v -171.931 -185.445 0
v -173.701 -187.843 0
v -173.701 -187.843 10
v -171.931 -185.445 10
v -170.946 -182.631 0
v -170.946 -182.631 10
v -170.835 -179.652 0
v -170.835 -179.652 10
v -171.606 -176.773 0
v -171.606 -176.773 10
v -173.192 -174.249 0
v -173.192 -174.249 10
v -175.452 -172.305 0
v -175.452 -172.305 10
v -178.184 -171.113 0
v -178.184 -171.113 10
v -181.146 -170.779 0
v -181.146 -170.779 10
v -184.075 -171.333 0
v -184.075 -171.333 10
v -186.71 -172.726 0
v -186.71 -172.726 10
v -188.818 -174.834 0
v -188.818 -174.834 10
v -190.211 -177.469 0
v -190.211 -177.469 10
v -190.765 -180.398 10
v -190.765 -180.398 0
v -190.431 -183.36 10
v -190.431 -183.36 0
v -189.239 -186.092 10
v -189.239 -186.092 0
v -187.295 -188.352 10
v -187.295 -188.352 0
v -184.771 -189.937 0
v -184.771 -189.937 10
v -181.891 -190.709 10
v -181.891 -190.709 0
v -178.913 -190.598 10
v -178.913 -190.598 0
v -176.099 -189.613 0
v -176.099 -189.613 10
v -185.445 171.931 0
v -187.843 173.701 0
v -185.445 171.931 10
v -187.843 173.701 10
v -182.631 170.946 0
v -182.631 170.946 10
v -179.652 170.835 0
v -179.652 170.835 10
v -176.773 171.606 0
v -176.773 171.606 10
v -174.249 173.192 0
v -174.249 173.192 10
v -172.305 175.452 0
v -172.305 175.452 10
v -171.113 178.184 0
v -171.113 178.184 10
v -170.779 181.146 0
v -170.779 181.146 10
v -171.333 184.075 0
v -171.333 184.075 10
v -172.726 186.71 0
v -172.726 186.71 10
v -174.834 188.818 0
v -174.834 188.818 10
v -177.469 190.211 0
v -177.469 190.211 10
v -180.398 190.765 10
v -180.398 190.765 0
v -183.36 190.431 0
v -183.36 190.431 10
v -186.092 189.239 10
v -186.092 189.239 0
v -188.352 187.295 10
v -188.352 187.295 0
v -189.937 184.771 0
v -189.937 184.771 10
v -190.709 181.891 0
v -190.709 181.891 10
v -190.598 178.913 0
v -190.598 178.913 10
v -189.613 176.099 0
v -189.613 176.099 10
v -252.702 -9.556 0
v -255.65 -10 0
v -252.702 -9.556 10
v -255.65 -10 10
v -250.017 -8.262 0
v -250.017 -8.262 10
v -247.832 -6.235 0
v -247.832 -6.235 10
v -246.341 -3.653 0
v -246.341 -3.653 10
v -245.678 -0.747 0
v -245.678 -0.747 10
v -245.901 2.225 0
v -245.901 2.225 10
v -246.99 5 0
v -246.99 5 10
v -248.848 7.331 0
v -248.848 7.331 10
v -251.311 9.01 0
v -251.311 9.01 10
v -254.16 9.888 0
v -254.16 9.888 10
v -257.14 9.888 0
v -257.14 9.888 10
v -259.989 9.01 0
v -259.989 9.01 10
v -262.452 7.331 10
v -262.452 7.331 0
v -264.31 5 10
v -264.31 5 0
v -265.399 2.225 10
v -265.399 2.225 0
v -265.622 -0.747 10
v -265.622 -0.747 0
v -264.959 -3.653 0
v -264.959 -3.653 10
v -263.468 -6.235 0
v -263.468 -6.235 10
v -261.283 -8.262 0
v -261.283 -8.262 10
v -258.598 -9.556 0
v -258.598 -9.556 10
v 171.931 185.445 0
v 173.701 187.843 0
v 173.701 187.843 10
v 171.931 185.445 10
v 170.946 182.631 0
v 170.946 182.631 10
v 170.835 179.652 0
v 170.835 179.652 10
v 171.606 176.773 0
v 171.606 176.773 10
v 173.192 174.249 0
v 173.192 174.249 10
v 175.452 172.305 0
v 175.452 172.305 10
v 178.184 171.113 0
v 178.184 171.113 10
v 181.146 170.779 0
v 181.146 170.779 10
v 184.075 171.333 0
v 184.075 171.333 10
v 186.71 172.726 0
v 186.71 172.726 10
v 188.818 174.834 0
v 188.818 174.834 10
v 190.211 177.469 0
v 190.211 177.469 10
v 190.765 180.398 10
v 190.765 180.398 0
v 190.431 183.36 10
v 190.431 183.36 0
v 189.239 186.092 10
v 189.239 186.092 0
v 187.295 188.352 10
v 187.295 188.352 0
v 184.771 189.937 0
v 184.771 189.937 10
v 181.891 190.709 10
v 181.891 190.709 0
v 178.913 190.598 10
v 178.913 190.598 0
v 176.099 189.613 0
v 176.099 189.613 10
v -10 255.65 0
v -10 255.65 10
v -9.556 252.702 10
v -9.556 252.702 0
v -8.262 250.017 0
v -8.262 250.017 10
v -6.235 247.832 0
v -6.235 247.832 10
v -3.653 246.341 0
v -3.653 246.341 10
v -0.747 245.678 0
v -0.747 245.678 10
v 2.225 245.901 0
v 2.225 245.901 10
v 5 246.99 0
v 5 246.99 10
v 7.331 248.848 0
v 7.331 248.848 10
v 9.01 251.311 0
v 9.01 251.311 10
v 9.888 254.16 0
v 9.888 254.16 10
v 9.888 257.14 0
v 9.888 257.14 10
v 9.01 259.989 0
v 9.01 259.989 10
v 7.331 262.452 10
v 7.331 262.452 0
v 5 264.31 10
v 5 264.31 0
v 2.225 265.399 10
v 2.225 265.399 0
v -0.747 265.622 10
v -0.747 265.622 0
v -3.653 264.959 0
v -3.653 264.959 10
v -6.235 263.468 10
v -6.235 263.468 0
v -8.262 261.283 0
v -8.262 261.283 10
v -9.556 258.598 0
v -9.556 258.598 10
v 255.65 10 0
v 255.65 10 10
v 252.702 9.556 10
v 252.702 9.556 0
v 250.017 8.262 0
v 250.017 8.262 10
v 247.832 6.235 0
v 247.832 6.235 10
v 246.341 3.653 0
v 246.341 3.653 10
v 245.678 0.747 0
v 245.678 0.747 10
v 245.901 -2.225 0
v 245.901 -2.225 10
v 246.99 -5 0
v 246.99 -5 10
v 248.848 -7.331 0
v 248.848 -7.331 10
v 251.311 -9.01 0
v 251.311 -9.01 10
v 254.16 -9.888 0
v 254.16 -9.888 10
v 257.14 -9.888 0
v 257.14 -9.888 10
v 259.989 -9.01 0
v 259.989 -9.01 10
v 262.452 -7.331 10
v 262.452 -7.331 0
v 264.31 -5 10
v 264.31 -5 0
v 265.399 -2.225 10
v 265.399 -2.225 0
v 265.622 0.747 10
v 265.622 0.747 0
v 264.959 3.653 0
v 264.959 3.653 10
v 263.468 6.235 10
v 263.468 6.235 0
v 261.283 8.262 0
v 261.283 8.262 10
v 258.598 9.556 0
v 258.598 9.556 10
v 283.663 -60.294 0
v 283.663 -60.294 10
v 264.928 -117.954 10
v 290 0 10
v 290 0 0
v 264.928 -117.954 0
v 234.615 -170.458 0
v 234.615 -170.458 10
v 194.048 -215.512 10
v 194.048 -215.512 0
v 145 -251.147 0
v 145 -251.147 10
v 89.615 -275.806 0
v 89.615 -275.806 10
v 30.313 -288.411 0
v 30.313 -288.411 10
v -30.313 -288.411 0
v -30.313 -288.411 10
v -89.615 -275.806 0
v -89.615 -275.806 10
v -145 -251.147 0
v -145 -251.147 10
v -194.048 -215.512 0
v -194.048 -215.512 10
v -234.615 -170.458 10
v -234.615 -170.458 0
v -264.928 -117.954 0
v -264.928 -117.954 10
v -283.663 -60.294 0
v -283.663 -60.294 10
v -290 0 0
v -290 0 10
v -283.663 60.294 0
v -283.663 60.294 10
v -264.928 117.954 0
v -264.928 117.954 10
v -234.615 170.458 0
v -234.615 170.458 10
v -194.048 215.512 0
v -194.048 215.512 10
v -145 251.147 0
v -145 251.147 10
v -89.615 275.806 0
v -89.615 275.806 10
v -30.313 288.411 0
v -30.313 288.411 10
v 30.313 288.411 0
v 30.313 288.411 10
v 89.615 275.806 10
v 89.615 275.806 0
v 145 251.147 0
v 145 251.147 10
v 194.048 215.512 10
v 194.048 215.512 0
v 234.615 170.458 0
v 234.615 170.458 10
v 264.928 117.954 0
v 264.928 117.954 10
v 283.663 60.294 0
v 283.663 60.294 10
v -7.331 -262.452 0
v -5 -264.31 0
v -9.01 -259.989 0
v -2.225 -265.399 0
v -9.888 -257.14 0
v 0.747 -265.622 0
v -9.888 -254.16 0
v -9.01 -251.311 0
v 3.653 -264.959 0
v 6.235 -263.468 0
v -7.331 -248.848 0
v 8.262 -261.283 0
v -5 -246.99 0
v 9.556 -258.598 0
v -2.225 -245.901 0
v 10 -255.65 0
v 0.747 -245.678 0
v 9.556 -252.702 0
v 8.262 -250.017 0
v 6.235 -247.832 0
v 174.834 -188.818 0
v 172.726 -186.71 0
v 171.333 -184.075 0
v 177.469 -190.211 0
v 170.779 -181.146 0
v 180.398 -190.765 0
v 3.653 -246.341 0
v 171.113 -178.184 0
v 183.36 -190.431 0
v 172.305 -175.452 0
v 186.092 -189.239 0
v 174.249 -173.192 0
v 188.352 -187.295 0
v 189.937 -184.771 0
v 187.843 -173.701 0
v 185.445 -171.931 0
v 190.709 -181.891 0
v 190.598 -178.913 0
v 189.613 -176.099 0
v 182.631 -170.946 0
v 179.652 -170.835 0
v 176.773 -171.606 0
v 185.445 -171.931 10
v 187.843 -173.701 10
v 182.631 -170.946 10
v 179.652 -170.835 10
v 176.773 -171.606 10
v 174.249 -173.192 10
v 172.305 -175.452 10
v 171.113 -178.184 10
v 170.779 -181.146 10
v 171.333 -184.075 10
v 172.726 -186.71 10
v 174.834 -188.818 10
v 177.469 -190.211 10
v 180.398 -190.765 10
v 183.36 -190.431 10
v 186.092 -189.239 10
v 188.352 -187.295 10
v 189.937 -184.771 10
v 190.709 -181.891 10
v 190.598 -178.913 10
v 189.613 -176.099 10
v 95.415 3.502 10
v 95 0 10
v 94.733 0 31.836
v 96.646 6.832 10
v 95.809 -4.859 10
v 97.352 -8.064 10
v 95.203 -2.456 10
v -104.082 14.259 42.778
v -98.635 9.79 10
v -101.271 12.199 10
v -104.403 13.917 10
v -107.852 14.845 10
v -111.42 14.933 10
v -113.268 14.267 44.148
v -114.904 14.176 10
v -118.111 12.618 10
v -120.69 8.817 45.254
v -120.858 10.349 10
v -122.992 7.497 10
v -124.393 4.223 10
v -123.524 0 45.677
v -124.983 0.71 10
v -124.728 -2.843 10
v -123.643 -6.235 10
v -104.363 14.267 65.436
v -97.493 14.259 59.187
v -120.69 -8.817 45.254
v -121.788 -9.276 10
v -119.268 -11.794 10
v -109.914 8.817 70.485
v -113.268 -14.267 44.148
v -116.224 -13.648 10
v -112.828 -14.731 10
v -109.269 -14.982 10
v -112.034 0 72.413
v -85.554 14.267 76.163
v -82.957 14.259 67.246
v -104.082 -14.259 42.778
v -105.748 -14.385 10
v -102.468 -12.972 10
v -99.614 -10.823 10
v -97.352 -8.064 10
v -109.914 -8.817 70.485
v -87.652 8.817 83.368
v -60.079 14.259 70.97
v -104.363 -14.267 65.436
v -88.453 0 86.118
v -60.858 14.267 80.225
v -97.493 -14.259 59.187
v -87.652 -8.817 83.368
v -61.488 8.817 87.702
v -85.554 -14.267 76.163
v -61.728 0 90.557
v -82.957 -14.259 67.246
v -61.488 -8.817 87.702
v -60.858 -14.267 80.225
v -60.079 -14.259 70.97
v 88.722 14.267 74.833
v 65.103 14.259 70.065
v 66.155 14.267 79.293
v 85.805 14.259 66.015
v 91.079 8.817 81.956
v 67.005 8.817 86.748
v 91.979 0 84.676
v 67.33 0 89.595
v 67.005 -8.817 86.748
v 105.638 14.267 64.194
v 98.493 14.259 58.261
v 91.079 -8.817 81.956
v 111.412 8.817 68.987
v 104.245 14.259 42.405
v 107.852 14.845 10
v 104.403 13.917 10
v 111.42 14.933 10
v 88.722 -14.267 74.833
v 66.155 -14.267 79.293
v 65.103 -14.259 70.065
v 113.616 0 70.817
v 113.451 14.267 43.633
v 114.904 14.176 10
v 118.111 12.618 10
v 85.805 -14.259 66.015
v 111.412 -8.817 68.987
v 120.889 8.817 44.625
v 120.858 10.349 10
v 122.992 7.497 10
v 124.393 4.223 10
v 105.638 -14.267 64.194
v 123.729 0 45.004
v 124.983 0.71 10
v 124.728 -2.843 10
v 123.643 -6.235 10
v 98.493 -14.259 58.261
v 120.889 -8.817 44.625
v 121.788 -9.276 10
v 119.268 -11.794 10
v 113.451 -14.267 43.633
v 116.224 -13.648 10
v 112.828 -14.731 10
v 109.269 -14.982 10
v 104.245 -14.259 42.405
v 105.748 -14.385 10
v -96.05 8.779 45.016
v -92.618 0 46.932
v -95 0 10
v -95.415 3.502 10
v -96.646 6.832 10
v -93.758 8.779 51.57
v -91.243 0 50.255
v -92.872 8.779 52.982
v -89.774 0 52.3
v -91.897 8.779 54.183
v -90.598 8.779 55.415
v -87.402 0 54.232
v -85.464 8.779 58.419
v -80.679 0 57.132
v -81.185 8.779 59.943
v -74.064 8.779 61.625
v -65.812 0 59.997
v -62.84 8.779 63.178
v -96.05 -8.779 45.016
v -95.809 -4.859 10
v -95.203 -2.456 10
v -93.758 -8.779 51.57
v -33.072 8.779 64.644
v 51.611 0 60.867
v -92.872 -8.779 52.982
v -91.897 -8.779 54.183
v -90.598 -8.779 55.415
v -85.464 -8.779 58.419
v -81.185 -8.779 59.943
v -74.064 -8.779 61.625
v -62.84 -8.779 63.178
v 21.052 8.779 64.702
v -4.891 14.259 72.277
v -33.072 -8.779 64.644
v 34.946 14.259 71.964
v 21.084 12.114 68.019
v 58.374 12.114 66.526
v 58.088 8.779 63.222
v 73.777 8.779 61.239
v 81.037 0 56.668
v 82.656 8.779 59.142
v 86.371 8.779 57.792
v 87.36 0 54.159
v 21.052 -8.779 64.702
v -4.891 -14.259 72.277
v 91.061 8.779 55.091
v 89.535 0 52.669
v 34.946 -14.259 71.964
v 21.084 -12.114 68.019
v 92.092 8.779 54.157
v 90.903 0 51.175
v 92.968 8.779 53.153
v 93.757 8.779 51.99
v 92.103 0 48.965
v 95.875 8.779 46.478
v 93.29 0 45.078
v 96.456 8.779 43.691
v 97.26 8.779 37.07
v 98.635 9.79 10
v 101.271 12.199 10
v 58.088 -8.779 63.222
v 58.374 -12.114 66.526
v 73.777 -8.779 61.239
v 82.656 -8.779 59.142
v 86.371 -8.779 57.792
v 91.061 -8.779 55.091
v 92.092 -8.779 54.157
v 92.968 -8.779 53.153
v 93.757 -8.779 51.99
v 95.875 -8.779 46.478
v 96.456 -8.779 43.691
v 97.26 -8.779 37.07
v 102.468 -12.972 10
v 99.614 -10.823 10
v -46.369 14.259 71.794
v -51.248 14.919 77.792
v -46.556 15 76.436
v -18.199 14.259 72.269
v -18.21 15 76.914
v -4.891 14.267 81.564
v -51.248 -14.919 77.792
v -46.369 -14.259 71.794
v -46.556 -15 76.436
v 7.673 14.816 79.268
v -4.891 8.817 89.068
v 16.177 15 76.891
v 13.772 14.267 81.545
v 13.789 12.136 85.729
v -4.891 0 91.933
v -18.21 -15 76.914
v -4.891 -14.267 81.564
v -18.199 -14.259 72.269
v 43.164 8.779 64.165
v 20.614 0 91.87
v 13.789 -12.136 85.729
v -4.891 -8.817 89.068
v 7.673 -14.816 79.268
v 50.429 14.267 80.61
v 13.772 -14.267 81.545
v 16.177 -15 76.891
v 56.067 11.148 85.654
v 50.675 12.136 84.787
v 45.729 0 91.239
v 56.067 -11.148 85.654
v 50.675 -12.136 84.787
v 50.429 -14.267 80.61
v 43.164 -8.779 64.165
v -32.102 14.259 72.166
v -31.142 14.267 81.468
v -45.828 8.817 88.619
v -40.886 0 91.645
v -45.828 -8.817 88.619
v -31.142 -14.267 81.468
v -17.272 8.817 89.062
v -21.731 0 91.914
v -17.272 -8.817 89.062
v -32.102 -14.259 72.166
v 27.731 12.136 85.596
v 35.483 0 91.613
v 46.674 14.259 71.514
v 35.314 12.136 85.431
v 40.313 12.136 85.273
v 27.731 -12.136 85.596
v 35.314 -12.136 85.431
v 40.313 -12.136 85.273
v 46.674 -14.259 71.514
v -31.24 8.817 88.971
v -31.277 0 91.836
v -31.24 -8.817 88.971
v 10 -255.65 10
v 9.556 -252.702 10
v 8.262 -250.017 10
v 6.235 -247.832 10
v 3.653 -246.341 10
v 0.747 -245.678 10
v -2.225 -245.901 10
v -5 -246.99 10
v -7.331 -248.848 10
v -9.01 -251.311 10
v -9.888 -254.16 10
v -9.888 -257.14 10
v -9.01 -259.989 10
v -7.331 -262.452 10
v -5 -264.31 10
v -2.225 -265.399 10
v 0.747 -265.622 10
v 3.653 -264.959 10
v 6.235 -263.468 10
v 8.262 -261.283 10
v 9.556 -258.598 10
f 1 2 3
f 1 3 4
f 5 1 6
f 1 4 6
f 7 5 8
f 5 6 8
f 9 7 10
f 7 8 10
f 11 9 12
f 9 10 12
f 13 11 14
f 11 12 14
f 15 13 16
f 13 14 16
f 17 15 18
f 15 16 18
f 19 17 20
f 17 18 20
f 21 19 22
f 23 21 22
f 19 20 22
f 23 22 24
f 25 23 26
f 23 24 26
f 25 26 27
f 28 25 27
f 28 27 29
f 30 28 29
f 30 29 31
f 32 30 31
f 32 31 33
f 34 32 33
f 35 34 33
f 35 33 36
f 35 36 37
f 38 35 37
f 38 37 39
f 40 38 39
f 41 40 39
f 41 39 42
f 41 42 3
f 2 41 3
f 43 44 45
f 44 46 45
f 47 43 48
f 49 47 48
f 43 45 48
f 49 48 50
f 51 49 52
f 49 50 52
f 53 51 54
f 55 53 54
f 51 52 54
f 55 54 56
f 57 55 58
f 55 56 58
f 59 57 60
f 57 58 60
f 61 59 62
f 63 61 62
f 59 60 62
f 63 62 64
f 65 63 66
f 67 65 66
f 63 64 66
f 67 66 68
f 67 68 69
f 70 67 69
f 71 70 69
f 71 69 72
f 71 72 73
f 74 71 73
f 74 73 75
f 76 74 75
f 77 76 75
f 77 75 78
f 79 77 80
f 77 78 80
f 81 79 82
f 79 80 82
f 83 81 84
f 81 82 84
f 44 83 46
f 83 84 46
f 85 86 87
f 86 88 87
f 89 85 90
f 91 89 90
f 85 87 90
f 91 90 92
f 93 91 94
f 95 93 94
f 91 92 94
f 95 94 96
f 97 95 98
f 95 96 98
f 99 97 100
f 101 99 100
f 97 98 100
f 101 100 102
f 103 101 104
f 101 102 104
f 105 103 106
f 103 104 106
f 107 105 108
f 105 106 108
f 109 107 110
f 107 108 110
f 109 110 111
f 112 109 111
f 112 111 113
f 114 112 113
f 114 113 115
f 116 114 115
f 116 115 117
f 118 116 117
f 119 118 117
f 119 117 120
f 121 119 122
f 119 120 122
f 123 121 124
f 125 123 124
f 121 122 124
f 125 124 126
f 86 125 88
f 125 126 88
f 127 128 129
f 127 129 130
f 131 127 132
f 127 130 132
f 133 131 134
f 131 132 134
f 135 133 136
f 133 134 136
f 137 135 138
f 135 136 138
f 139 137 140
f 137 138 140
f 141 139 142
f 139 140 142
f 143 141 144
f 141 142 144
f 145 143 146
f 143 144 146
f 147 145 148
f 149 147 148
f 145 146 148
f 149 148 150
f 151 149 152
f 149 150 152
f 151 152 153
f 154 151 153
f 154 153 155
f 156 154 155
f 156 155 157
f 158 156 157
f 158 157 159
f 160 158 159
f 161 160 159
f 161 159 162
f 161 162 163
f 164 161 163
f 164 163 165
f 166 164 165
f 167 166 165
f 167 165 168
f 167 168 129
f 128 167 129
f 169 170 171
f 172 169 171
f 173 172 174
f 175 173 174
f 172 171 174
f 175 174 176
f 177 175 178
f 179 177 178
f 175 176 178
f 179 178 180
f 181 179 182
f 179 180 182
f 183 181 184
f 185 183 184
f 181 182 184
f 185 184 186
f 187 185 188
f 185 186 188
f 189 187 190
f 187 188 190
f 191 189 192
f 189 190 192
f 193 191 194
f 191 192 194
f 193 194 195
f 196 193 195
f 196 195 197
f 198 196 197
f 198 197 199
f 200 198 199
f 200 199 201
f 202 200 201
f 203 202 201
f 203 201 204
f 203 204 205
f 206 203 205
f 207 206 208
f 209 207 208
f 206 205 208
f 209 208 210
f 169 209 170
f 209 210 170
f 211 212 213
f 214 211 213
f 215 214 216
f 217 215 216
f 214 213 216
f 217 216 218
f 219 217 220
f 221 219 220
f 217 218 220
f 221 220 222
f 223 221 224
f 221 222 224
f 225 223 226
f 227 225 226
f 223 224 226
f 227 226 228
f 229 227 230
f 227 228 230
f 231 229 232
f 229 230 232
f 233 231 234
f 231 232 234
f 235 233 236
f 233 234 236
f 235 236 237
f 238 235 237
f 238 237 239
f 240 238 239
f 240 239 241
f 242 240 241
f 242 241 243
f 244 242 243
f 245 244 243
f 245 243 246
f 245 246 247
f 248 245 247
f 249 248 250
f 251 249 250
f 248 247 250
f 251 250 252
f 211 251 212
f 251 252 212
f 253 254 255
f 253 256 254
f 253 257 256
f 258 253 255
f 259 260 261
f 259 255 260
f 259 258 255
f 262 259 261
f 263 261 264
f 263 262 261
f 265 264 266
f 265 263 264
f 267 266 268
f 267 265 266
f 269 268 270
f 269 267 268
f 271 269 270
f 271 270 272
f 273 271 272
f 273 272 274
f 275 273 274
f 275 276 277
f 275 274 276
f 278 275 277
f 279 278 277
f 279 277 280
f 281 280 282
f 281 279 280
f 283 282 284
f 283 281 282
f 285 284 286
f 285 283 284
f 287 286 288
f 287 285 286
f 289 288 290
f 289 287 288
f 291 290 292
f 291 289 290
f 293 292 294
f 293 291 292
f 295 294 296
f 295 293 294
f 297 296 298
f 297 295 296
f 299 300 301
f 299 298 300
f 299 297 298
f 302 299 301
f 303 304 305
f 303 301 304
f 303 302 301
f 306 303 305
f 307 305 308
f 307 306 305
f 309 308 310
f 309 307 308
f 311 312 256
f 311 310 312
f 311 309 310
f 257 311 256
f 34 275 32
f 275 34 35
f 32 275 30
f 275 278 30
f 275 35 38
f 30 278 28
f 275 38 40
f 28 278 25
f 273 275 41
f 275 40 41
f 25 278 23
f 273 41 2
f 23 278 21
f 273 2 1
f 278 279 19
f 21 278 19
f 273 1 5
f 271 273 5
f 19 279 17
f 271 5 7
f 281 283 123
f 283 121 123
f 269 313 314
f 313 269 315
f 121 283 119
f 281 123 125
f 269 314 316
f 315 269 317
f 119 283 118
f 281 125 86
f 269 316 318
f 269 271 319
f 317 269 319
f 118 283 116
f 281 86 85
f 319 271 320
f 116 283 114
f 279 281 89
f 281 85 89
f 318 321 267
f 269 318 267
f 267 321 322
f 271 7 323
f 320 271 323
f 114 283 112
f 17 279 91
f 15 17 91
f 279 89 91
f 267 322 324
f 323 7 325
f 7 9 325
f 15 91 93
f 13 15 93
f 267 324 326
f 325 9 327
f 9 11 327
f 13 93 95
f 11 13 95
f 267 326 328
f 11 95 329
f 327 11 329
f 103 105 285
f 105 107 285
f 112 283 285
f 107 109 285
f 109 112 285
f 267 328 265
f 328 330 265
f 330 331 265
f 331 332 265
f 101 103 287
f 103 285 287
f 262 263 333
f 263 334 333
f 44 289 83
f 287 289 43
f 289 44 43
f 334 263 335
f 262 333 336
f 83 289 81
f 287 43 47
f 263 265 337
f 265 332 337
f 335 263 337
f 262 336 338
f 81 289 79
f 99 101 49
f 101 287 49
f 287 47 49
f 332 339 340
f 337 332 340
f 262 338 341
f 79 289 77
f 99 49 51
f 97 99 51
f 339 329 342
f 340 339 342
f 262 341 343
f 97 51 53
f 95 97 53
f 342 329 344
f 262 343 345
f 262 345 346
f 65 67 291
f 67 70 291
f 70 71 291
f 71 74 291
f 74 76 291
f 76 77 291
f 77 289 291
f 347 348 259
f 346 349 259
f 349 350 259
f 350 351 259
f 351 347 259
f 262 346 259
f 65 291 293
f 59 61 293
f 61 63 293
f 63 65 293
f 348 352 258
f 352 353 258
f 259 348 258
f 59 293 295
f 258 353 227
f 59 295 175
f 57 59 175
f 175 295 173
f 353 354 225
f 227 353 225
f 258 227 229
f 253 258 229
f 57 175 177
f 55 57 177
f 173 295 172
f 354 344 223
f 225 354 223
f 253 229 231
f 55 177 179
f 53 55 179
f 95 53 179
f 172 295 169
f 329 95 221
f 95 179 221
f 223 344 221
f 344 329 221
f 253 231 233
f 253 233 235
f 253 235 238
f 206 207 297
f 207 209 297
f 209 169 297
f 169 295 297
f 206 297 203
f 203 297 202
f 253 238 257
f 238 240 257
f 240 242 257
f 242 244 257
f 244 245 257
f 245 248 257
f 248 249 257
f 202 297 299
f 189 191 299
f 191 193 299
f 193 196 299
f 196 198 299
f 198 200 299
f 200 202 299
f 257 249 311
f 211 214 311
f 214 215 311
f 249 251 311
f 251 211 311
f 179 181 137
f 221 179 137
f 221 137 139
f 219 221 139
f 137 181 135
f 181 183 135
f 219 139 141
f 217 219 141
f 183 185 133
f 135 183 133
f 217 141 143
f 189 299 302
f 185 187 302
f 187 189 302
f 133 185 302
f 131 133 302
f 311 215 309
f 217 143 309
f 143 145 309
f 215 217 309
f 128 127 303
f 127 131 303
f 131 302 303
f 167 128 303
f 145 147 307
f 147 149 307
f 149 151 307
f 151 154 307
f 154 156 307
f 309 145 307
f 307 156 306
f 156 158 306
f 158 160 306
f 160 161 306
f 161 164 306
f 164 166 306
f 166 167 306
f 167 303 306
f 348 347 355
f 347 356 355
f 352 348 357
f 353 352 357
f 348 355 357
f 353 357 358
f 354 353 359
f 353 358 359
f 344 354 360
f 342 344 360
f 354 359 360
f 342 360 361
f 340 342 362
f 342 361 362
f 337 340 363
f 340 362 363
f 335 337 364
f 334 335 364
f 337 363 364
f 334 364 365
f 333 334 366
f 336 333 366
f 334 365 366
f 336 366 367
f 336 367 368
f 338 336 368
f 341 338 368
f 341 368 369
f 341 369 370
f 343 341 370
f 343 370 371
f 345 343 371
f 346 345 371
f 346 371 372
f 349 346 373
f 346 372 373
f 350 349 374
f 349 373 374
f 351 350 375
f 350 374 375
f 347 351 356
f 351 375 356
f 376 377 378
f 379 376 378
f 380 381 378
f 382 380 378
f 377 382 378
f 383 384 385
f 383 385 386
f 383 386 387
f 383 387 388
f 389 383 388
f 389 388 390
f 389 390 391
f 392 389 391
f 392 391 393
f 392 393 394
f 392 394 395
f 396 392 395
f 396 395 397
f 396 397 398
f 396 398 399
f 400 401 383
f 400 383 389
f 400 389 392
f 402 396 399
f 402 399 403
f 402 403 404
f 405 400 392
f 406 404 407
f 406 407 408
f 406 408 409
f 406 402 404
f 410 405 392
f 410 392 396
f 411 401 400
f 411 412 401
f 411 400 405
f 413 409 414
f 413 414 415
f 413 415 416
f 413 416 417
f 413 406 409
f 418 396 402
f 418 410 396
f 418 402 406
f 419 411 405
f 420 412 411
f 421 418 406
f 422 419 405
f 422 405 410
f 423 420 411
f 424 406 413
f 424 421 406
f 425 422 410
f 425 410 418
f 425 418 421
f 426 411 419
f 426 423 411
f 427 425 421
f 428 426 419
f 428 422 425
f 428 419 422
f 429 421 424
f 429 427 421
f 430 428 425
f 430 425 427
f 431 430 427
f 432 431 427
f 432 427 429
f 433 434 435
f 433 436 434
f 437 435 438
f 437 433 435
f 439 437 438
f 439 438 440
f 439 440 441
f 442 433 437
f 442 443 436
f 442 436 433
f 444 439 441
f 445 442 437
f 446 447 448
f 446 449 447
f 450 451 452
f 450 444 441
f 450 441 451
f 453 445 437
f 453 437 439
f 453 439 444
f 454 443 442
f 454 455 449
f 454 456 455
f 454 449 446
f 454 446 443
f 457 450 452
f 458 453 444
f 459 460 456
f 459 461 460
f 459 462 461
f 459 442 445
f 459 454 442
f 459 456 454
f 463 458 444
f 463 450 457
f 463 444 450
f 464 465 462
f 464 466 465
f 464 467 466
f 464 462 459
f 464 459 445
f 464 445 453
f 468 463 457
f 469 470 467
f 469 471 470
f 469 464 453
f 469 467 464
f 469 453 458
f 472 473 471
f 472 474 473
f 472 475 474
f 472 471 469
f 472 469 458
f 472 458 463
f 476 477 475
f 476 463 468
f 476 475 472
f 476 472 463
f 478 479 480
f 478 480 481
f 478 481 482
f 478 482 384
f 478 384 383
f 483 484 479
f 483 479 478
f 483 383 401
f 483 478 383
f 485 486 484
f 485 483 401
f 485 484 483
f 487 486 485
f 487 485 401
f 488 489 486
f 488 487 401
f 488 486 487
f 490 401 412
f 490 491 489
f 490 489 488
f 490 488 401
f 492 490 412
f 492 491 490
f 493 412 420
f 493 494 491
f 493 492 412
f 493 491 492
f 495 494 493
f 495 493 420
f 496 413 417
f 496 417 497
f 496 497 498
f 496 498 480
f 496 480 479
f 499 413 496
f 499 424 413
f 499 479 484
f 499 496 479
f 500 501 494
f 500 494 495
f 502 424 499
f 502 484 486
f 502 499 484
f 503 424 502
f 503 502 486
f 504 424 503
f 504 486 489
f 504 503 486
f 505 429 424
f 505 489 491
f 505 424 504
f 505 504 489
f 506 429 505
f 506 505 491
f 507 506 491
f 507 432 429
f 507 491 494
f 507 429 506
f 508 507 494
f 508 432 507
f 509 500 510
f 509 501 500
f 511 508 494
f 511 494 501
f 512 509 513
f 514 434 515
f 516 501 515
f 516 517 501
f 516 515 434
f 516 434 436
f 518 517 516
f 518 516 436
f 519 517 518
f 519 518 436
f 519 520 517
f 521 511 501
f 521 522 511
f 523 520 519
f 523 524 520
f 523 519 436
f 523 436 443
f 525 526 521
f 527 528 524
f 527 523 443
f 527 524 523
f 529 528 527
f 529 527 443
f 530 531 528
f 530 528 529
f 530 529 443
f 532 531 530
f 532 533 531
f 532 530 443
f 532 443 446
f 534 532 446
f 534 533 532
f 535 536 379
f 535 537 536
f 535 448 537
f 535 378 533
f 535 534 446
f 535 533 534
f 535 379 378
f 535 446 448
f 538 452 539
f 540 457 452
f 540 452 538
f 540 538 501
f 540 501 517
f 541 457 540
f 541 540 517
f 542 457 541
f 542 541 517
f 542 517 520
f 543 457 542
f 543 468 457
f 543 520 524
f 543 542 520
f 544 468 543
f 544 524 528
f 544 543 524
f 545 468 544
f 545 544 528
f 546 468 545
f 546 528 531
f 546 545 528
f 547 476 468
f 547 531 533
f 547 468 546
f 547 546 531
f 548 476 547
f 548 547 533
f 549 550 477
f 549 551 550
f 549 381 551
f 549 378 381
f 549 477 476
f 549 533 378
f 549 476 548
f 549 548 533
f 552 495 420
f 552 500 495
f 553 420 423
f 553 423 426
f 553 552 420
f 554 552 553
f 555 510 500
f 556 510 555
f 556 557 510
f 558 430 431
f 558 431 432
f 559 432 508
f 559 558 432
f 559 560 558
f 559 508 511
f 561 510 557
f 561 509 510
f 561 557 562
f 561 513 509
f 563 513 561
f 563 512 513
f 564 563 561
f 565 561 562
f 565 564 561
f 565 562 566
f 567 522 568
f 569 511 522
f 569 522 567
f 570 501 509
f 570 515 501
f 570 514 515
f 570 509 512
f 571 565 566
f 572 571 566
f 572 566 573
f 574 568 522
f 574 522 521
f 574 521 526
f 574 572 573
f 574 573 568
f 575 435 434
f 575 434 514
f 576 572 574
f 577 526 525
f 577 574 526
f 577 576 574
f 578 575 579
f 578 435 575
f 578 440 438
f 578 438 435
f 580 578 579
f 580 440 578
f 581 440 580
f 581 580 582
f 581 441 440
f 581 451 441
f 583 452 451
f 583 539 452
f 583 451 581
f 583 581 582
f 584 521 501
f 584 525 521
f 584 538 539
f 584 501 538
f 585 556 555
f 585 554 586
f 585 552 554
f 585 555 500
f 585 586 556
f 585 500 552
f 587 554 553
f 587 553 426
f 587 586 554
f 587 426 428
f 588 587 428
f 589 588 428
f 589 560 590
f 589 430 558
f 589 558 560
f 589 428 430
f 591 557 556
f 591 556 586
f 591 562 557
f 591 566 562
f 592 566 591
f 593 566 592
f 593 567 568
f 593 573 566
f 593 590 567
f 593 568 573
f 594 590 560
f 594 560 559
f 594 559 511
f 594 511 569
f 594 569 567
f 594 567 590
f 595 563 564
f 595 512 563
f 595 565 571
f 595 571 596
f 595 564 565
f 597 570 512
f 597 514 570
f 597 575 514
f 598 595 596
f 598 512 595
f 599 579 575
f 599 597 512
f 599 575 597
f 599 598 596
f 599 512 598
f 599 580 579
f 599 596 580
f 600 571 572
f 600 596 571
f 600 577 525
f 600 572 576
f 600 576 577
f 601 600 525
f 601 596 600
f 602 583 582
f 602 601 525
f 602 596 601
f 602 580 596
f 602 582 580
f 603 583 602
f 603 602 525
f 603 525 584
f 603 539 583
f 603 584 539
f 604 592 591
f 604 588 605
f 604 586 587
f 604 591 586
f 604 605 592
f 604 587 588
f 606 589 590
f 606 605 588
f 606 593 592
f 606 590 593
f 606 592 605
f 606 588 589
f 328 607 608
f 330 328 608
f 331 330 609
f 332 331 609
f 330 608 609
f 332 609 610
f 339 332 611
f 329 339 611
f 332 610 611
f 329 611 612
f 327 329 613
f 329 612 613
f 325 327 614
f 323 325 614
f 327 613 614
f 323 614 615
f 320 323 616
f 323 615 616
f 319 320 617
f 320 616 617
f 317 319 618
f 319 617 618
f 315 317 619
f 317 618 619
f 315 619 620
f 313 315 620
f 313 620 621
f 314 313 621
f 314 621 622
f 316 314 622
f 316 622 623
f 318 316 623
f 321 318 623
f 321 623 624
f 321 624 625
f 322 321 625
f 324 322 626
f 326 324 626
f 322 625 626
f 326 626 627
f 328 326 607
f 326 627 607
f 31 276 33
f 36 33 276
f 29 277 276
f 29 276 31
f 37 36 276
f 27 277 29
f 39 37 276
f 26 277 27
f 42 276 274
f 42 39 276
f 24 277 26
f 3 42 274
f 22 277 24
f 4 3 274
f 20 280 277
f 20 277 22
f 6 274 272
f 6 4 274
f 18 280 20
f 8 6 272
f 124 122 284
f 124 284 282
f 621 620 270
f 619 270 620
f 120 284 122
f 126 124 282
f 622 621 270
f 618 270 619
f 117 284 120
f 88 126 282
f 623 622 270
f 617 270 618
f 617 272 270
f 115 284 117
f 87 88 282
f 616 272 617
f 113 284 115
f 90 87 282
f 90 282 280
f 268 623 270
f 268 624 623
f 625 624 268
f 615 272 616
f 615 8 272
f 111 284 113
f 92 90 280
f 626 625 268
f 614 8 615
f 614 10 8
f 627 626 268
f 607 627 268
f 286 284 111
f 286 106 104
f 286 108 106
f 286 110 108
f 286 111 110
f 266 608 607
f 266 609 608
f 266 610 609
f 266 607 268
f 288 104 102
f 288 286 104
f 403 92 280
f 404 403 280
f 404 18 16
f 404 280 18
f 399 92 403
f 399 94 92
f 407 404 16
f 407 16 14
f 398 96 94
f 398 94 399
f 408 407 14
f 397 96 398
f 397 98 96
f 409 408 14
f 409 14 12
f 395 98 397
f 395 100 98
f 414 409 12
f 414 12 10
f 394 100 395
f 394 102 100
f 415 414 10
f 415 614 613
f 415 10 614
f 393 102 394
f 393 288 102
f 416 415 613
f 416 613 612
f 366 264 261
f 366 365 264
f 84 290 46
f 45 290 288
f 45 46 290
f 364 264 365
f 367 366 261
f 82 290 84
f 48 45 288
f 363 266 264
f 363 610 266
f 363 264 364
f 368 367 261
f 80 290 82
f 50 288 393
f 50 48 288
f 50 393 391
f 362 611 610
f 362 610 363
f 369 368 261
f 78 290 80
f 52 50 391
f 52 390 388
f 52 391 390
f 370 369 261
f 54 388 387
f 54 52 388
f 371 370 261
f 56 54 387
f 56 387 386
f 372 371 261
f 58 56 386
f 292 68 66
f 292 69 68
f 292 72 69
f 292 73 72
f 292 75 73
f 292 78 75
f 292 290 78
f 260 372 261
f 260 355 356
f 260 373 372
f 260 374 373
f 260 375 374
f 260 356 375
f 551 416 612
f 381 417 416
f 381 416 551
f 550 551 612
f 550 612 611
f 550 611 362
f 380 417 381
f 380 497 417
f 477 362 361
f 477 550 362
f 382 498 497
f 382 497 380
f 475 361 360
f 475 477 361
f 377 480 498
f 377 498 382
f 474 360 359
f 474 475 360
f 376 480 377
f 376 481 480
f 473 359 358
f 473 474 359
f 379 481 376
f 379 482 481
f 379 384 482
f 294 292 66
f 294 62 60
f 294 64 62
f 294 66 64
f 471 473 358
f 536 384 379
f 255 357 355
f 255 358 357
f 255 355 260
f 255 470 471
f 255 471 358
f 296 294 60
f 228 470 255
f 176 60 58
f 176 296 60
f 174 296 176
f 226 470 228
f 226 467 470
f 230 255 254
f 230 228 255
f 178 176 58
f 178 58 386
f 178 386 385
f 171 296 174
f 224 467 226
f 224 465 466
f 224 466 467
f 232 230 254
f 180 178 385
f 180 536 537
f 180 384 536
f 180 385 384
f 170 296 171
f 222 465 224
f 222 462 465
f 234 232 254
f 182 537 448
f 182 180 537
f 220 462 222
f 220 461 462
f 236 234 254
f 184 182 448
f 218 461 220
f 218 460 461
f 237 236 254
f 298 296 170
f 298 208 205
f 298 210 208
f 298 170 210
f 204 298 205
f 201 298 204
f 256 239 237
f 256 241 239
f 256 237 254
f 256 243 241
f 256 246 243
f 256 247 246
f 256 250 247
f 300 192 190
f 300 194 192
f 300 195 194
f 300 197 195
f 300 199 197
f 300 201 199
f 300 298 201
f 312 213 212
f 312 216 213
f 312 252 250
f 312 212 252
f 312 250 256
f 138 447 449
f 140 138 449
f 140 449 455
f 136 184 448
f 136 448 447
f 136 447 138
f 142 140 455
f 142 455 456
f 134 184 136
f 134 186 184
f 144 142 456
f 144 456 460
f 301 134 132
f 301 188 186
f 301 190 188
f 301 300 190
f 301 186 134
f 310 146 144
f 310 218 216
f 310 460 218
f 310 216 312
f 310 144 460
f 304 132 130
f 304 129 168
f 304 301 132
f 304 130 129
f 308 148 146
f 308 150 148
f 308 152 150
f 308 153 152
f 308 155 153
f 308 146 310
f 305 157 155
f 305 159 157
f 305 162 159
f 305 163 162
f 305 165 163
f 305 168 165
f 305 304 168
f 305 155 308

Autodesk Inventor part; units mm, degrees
ref_plane "YZ Plane" through (0, 0, 0) normal (1, 0, 0) x (0, 1, 0)
ref_plane "XZ Plane" through (0, 0, 0) normal (0, 1, 0) x (-1, 0, 0)
ref_plane "XY Plane" through (0, 0, 0) normal (0, 0, 1) x (1, 0, 0)
sketch "草图1" plane through (0, 0, 0) normal (0, 0, 1) x (1, 0, 0)
  circle A0 centre (0, 0) radius 290
  dimension "d0" = 580
extrude "拉伸1" add sketch "草图1" along normal blind 10
sketch "草图2" plane through (0, 0, 0) normal (0, 0, 1) x (1, 0, 0)
  line L0 (0, 0) -> (255.65, 0)
  circle A0 centre (0, 0) radius 255.65
  dimension "d4" = 255.65
hole "孔1" at (255.65, 0, 0) direction (0, 0, 1) diameter 20 end through all
pattern_circular "环形阵列1" count 8 over 360 about axis through (0, 0, -10) along (0, 0, 1) of "孔1"
sketch "草图3" plane through (0, 0, 10) normal (0, 0, 1) x (1, 0, 0)
  circle A0 centre (0, 0) radius 290 projected
  circle A1 centre (-110, 0) radius 15
  circle A2 centre (110, 0) radius 15
  dimension "d15" = 30
  dimension "d16" = 110
  dimension "d18" = 30
  dimension "d19" = 110
sketch "草图4" plane through (0, 0, 0) normal (0, 1, 0) x (-1, 0, 0)
  line L0 (110, 10) -> (110, 52.7861) construction
  line L1 (-110, 52.7861) -> (-110, 10) construction
  spline S0 degree 4 poles (110, 10) (110, 52.7861) (110, 76.933) (17.246, 76.933) (-17.246, 76.933) (-110, 76.933) (-110, 52.7861) (-110, 10) knots 1 1 1 1 1 1.296402 1.477939 1.714323 2 2 2 2 2
  line L2 (110, 52.7861) -> (110, 76.933) construction
  line L3 (-110, 76.933) -> (-110, 52.7861) construction
  line L4 (110, 76.933) -> (17.246, 76.933) construction
  line L5 (17.246, 76.933) -> (-17.246, 76.933) construction
  line L6 (-17.246, 76.933) -> (-110, 76.933) construction
  line L7 (0, -18.6745) -> (0, 112.0473) projected
  point P0 (0, 0)
sweep "扫掠2" add profiles "草图3" path "草图4" path curves S0 contours A1
properties part number "人孔法兰"
